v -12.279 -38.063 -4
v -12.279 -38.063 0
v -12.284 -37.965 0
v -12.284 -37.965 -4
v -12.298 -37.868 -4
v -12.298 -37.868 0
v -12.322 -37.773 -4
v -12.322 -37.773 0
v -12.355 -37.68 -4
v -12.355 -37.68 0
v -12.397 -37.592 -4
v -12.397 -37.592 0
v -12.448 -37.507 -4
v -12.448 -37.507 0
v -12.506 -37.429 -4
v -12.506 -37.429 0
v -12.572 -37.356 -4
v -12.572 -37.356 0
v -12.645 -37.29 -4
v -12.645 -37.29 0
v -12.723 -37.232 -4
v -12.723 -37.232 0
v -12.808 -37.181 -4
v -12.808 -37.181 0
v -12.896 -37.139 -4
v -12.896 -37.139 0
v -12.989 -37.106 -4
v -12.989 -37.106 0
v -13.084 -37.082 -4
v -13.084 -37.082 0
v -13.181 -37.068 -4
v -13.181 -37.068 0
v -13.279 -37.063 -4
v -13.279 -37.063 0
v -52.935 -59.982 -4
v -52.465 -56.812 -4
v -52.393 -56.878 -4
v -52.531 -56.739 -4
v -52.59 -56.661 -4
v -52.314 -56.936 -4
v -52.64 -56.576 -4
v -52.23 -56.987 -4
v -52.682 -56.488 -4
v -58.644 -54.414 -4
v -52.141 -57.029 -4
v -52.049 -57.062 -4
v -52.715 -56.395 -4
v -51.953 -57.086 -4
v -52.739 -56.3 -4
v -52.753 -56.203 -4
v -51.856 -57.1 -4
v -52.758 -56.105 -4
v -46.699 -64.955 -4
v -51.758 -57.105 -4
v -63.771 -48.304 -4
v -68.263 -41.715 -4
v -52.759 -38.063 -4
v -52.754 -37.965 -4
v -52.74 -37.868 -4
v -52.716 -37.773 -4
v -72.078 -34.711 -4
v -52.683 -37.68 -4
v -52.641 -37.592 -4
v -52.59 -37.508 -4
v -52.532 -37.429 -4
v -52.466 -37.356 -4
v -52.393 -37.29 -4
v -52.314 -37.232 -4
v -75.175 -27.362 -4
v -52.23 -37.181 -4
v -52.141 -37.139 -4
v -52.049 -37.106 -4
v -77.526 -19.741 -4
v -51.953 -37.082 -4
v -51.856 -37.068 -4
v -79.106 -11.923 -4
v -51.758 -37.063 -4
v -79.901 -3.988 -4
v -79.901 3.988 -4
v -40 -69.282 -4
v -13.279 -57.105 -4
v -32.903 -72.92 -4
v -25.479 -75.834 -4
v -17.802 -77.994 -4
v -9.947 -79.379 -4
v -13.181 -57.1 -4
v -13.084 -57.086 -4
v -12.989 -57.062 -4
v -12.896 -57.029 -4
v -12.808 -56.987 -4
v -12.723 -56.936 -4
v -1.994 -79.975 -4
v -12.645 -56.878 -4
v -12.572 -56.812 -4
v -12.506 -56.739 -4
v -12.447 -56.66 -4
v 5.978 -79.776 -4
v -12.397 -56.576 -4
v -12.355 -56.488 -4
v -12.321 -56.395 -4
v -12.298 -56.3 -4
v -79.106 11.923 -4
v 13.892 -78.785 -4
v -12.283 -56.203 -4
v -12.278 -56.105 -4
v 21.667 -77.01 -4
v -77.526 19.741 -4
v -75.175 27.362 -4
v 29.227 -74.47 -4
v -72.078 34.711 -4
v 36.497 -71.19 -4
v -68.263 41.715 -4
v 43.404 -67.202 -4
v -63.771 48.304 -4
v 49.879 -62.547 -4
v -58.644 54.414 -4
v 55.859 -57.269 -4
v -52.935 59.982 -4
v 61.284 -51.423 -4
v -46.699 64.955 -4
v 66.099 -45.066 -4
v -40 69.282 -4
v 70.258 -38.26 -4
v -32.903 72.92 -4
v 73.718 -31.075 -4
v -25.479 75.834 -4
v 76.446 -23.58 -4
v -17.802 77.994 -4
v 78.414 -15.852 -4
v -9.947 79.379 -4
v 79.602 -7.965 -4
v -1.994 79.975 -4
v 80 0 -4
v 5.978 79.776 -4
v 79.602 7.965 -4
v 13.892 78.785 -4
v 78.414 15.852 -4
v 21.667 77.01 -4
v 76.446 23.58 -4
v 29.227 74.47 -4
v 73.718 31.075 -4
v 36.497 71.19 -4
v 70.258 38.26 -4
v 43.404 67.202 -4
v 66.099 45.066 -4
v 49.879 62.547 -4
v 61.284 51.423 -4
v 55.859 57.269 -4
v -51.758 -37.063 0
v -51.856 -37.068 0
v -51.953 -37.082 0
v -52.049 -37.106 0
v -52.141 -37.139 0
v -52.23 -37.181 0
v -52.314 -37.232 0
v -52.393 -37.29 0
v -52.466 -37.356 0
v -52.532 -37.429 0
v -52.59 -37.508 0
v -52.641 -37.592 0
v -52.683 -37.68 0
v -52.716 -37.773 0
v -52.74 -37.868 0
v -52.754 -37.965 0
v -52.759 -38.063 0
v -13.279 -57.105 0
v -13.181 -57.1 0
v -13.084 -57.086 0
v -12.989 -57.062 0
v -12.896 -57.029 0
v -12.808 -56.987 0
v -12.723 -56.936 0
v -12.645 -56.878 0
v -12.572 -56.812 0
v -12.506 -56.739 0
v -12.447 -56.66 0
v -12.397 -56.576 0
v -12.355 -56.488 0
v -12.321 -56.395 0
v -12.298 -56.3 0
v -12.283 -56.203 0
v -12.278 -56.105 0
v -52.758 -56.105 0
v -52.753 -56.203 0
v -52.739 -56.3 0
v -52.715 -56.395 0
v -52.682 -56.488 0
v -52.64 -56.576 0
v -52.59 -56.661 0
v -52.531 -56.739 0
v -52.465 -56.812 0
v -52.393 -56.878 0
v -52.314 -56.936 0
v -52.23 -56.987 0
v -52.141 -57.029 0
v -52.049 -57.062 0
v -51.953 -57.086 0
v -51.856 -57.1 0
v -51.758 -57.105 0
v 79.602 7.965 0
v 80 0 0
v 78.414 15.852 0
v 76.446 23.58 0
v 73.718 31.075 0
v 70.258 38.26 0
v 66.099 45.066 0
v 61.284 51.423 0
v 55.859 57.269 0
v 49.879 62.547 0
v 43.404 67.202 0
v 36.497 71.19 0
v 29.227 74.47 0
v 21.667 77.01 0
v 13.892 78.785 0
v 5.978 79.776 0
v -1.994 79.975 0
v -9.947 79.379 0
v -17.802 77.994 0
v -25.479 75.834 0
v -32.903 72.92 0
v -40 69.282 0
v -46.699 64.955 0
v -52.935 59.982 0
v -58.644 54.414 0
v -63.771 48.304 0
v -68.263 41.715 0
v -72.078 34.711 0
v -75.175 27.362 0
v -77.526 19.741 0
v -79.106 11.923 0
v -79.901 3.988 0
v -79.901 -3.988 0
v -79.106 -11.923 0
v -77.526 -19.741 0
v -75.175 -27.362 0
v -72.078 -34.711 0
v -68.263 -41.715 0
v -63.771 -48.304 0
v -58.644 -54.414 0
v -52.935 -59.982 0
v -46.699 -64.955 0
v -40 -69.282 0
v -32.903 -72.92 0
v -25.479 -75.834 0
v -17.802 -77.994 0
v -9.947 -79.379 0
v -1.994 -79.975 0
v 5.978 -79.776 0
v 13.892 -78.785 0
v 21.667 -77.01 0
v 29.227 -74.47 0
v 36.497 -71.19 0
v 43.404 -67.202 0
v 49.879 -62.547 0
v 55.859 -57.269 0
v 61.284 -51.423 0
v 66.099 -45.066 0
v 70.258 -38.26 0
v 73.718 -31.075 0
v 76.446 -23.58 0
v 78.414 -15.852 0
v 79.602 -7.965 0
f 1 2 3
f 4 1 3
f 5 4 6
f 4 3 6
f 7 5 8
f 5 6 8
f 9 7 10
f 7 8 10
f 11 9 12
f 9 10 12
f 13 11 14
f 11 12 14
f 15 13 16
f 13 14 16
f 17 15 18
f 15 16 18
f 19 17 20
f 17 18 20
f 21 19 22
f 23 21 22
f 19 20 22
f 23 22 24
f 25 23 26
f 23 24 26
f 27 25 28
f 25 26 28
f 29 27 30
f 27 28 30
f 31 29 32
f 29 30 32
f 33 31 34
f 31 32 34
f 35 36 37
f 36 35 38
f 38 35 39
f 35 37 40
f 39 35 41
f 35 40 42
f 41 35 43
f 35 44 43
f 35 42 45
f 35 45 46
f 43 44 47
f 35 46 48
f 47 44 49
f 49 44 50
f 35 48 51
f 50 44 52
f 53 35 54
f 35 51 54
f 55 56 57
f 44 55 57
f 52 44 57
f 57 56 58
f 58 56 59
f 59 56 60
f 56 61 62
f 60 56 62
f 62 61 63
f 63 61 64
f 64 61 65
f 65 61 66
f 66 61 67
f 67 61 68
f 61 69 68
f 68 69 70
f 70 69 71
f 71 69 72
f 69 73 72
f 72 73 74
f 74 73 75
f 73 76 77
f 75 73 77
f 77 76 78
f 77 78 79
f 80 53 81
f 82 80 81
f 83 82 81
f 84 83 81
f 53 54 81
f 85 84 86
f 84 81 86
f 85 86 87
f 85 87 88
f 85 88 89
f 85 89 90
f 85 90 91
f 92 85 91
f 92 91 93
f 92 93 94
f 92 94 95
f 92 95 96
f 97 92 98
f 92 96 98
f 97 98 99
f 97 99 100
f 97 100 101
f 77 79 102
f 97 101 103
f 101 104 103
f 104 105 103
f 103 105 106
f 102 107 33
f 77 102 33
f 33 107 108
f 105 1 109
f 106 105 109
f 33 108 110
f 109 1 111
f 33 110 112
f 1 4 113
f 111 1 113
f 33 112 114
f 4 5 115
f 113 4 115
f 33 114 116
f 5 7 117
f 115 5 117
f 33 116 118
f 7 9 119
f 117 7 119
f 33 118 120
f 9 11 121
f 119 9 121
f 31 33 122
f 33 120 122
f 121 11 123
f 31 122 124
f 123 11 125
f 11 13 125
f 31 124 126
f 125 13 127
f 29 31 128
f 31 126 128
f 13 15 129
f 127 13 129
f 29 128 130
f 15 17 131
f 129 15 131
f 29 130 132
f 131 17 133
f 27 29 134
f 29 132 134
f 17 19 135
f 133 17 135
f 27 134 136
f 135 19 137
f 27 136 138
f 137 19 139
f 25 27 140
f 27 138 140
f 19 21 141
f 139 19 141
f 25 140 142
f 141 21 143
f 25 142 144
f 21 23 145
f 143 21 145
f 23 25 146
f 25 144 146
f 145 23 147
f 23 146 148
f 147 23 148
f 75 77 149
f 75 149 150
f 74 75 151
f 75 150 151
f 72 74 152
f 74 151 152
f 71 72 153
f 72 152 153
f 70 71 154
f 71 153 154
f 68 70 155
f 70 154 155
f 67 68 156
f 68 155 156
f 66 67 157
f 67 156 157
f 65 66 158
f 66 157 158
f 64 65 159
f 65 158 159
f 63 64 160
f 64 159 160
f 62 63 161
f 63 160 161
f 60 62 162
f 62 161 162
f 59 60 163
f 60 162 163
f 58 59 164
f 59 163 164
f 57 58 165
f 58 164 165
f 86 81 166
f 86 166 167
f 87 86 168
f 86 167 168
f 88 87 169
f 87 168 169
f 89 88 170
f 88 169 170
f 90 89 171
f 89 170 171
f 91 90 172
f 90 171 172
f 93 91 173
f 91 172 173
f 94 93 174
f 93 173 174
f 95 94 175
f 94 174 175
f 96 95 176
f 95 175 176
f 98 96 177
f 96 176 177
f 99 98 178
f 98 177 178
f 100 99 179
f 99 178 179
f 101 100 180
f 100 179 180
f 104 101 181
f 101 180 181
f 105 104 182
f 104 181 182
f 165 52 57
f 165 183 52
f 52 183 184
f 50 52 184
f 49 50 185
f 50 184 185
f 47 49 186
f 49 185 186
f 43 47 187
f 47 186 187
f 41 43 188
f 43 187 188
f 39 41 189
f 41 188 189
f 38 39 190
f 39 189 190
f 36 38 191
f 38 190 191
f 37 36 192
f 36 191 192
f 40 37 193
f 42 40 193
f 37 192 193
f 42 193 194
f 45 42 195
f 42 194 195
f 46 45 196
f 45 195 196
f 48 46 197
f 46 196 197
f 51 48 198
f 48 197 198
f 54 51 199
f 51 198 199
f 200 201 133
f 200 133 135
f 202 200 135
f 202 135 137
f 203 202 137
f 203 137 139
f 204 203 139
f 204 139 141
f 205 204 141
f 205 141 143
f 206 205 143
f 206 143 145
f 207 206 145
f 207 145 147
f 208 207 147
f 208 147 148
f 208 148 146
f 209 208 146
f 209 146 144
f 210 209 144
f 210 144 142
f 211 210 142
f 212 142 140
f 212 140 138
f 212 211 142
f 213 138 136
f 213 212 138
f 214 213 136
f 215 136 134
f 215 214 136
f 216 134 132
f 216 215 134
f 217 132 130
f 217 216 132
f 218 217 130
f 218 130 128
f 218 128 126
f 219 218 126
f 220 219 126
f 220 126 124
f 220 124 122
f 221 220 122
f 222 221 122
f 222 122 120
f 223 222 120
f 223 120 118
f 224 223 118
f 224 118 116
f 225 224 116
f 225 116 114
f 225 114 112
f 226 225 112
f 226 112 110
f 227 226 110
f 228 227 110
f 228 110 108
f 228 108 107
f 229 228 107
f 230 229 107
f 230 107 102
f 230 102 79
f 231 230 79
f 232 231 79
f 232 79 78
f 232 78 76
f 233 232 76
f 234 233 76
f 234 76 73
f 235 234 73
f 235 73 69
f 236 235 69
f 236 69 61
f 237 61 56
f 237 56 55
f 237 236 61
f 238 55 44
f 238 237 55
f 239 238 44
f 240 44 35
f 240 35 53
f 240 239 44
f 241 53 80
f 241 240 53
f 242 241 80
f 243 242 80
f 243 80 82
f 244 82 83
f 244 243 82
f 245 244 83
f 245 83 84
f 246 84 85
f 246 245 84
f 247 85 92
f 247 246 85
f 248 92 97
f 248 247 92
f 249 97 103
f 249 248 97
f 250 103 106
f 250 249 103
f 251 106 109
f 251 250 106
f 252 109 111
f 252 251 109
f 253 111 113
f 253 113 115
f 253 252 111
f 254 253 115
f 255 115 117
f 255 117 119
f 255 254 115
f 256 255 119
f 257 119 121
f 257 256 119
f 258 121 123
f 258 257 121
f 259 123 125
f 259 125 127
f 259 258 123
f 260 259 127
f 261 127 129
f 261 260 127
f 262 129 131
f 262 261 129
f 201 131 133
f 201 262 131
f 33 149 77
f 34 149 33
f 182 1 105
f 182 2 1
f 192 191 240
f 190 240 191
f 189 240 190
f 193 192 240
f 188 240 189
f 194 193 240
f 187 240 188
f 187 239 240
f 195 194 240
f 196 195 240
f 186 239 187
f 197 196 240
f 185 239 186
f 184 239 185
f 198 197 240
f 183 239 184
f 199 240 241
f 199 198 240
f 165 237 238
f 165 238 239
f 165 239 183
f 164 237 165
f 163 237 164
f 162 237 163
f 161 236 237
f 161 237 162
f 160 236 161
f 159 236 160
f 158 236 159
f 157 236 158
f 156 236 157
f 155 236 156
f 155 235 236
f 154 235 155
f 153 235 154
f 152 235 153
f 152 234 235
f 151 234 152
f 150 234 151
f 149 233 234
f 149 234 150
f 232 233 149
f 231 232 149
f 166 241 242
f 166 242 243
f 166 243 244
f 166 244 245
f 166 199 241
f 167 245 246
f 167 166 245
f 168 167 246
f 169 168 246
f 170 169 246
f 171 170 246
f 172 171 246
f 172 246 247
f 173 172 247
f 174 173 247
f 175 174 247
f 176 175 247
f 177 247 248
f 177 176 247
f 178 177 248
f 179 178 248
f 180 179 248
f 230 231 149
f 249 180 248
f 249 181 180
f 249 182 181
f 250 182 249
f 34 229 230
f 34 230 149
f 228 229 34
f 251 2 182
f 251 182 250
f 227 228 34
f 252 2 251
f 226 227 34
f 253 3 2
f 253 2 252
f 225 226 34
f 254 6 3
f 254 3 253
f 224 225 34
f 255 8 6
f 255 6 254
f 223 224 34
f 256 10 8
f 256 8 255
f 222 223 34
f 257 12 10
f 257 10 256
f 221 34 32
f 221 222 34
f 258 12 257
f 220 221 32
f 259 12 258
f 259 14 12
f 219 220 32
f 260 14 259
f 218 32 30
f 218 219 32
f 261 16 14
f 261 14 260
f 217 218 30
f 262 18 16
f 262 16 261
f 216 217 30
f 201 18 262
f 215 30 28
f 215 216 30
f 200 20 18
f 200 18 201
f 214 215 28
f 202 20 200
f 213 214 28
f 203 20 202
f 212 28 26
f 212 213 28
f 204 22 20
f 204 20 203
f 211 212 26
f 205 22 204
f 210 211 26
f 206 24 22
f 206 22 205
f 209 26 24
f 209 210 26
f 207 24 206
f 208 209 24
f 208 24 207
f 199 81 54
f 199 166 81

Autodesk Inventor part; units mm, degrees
ref_plane "YZ Plane" through (0, 0, 0) normal (1, 0, 0) x (0, 1, 0)
ref_plane "XZ Plane" through (0, 0, 0) normal (0, 1, 0) x (-1, 0, 0)
ref_plane "XY Plane" through (0, 0, 0) normal (0, 0, 1) x (1, 0, 0)
sketch "Эскиз1" plane through (0, 0, 0) normal (0, 0, 1) x (1, 0, 0)
  circle A0 centre (0, 0) radius 80
  line L0 (-52.7593, -38.063) -> (-52.778, -56.063) projected
  line L1 (-14.2583, -37.1029) -> (-50.7583, -37.0651) projected
  line L2 (-12.278, -56.105) -> (-12.2594, -38.105) projected
  line L3 (-50.779, -57.0651) -> (-14.279, -57.1029) projected
  line L4 (-51.7583, -37.063) -> (-13.279, -37.063)
  line L5 (-12.279, -38.063) -> (-12.279, -56.105)
  line L6 (-13.279, -57.105) -> (-51.7583, -57.105)
  line L7 (-52.7583, -56.105) -> (-52.7583, -38.063)
  arc A1 (-52.7583, -56.105) -> (-51.7583, -57.105) centre (-51.7583, -56.105) ccw
  arc A2 (-51.7583, -37.063) -> (-52.7583, -38.063) centre (-51.7583, -38.063) ccw
  arc A3 (-13.279, -57.105) -> (-12.279, -56.105) centre (-13.279, -56.105) ccw
  arc A4 (-12.279, -38.063) -> (-13.279, -37.063) centre (-13.279, -38.063) ccw
  point P0 (-52.7583, -37.063)
  dimension "d2" = 160
  dimension "d3" = 1
extrude "Выдавливание1" add sketch "Эскиз1" against normal blind 4
properties part number "нижний эллипс головы"
